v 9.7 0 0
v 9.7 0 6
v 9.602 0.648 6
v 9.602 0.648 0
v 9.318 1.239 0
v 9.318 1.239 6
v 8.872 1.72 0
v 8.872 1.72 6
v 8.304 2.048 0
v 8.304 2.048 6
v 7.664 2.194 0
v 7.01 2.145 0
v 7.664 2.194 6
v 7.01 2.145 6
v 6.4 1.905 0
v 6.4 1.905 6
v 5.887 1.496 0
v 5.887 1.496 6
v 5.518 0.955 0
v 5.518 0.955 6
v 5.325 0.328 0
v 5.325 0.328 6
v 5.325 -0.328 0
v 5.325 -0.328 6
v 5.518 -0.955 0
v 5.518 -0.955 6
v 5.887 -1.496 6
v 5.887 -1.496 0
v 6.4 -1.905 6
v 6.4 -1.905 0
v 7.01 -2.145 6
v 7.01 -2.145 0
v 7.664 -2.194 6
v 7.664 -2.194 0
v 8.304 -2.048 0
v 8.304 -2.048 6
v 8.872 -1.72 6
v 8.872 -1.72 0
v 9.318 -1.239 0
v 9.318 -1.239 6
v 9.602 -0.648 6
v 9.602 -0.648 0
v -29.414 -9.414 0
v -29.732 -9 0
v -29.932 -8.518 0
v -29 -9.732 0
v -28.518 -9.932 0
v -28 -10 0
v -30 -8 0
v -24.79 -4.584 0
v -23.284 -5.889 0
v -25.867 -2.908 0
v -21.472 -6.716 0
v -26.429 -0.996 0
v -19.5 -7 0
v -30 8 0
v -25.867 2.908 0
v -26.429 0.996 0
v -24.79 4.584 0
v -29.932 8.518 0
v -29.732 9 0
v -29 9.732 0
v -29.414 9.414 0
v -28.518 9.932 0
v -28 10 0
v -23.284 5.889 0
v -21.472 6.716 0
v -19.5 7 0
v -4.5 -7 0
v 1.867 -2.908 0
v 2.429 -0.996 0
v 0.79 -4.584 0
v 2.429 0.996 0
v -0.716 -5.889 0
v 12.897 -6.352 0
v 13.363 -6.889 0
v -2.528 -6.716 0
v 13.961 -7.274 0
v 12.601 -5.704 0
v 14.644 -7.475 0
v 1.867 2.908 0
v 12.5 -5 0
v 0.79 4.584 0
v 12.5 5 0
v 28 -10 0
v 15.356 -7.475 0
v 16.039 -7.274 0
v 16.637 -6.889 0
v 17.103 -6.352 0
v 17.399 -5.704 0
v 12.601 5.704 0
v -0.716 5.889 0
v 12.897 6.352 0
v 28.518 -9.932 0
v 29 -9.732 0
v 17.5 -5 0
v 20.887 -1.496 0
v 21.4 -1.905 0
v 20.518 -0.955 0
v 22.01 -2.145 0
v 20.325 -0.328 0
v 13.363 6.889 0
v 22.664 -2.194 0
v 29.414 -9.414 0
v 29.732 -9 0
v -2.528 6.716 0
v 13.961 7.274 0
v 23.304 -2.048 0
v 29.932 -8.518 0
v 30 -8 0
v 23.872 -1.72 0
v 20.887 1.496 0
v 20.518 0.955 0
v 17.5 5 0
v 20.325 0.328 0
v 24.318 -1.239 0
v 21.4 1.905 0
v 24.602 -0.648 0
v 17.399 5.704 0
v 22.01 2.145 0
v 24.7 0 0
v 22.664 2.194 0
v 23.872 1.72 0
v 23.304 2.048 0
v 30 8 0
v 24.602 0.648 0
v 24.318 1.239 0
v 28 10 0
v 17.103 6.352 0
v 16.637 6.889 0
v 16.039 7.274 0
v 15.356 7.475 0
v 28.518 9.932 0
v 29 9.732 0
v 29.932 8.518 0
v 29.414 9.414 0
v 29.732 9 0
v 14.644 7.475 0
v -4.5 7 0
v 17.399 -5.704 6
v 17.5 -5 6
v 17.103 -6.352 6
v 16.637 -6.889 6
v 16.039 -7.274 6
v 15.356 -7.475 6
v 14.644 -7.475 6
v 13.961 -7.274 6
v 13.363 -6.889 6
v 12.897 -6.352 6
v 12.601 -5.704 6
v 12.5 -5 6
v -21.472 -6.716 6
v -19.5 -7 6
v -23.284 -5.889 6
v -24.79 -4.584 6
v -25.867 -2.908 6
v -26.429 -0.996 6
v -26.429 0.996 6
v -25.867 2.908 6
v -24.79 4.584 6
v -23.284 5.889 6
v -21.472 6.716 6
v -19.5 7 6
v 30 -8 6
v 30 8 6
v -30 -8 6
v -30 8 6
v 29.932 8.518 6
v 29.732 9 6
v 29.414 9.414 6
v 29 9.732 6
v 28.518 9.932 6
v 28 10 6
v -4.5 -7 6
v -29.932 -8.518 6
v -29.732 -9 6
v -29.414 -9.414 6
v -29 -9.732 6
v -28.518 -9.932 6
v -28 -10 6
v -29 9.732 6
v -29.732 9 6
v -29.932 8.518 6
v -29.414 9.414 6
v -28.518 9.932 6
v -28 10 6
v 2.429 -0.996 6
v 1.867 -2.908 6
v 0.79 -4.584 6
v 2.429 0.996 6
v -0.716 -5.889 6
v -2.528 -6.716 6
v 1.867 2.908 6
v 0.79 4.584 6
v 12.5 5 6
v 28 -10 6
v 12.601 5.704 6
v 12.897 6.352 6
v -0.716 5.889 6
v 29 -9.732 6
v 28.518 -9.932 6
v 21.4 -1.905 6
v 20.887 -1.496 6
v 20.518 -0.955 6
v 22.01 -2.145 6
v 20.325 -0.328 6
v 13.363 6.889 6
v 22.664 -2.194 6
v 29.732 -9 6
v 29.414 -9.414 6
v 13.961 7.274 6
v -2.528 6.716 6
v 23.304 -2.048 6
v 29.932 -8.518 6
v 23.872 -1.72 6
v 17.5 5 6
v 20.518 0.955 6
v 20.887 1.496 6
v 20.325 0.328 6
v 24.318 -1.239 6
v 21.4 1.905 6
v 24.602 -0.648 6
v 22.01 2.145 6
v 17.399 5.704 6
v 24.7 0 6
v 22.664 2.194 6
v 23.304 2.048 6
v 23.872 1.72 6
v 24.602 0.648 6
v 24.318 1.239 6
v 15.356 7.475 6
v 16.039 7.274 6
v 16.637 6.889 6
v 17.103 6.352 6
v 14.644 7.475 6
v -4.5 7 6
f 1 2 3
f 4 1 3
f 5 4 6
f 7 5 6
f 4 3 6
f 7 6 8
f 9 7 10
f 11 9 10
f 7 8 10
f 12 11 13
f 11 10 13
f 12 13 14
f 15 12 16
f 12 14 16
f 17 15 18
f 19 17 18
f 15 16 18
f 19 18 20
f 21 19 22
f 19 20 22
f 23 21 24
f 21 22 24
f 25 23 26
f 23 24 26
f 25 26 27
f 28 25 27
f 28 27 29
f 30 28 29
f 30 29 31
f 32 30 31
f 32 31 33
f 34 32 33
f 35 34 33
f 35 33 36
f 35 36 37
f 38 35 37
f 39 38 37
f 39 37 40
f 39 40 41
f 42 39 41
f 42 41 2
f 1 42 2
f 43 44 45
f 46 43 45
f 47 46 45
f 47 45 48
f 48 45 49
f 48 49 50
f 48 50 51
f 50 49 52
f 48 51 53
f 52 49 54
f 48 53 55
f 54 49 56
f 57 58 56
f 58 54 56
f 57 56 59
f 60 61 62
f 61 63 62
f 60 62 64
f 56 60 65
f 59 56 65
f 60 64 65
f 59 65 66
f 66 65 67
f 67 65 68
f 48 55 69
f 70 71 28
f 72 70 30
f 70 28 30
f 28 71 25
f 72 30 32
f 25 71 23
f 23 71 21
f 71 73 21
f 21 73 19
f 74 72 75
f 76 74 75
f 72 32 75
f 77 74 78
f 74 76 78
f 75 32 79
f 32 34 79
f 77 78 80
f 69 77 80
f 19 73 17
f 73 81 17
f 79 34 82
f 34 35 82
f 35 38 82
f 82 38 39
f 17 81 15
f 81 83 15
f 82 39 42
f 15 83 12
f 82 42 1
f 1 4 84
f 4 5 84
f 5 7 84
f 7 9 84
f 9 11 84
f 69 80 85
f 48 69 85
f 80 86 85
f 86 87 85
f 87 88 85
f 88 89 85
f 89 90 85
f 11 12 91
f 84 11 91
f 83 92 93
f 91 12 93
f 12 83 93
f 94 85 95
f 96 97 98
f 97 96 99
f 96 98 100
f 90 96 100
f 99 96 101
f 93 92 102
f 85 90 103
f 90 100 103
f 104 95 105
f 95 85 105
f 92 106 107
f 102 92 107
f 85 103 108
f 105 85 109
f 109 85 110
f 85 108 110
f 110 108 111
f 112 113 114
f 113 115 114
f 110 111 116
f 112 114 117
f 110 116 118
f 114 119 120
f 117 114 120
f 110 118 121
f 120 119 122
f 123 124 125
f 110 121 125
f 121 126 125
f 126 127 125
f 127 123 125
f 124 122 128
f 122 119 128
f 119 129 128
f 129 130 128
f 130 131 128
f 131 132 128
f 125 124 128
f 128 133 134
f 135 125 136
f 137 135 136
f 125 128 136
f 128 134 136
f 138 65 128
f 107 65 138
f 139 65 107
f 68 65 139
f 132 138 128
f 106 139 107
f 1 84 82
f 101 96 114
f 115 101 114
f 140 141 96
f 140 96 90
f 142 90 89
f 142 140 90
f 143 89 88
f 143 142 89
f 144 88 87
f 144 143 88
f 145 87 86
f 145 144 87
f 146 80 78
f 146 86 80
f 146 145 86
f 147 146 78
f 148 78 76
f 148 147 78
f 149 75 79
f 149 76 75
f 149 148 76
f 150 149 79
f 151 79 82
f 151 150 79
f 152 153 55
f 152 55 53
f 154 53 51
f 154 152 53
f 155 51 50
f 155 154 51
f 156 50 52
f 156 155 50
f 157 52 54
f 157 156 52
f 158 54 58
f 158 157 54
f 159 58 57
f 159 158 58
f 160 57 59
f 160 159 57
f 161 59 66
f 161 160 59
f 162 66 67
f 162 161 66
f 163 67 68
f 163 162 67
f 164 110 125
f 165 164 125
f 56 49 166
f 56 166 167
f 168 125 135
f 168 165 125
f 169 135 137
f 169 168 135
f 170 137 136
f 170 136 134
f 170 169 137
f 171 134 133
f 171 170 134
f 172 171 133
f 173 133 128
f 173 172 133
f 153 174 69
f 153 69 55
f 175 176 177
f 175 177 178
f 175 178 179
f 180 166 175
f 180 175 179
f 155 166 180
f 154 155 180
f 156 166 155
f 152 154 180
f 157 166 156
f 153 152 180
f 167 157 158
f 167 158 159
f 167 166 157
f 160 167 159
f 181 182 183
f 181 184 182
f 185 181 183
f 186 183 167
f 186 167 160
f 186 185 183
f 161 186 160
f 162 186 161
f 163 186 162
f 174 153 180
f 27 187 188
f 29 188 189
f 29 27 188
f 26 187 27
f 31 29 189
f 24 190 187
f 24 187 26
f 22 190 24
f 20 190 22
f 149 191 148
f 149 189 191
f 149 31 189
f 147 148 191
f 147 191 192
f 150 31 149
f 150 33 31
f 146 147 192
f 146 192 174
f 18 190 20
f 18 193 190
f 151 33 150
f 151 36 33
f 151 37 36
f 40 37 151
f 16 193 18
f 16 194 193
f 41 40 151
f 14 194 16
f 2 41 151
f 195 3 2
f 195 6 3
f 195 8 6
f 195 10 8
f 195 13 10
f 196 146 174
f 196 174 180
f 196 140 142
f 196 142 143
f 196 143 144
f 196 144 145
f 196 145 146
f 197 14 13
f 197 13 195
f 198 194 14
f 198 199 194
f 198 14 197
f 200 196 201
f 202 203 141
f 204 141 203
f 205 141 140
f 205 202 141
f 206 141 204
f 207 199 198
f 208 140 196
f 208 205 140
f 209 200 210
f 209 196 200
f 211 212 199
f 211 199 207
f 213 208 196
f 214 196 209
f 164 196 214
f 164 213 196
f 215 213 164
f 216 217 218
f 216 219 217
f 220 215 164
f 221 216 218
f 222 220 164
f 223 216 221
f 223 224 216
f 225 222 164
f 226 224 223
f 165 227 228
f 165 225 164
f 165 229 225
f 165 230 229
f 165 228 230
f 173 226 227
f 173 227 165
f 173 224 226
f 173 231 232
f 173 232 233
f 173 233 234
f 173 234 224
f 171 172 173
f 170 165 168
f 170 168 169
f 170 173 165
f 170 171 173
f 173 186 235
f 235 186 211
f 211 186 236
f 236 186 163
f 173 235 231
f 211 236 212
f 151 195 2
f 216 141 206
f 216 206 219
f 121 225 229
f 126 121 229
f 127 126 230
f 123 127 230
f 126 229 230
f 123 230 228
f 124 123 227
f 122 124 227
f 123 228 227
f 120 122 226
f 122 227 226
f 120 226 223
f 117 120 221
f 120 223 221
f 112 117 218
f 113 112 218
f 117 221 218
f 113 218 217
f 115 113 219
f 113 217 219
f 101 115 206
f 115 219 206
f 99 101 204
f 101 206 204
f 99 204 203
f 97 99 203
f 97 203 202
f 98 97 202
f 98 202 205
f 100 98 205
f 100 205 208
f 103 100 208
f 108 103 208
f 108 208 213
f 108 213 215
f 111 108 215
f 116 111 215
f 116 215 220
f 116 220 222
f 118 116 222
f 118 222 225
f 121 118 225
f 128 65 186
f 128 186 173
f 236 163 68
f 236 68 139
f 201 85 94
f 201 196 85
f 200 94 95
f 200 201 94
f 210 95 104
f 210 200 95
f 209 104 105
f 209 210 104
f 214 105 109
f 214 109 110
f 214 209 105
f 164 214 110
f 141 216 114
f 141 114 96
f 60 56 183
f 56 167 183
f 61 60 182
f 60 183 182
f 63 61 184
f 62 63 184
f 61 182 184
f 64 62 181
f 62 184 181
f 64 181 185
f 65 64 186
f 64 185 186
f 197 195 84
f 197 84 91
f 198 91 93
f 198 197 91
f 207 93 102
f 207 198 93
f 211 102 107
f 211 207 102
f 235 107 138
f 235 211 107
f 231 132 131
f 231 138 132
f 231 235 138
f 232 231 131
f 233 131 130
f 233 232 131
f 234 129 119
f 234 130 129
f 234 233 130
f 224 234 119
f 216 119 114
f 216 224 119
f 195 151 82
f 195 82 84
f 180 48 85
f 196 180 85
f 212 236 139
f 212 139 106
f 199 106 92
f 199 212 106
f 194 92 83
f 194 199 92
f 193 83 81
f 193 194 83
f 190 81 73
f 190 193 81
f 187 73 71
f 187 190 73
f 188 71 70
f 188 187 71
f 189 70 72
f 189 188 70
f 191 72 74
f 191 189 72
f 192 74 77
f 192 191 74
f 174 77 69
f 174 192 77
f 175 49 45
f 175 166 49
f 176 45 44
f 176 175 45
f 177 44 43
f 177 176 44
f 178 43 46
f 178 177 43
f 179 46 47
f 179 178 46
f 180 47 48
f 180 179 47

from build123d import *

# Parameters (mm, degrees)
SKETCH_1_W          = 60
SKETCH_1_H          = 20
EXTRUDE_1_DEPTH     = 6
FILLET_1_R          = 2
SKETCH_2_R          = 2.2
CUT_EXTRUDE_1_DEPTH = 33.186953879
CUT_EXTRUDE_2_DEPTH = 33.186953879


with BuildPart() as part:
    # 草图1 → 凸台-拉伸1 (new body)
    with BuildSketch(Plane.XY):
        Rectangle(SKETCH_1_W, SKETCH_1_H)
    extrude(amount=EXTRUDE_1_DEPTH)

    # 圆角1
    fillet_1_edges = [part.edges().sort_by_distance(p)[0] for p in [
        (30, -10, 3),
        (-30, -10, 3),
        (-30, 10, 3),
        (30, 10, 3),
    ]]
    fillet(fillet_1_edges, radius=FILLET_1_R)

    # 草图2 → 切除-拉伸1 (cut, through all)
    with BuildSketch(Plane.XY.offset(6)):
        with Locations((22.5, 0)):
            Circle(SKETCH_2_R)
        with Locations((7.5, 0)):
            Circle(SKETCH_2_R)
    extrude(amount=-CUT_EXTRUDE_1_DEPTH, mode=Mode.SUBTRACT)

    # 草图3 → 切除-拉伸2 (cut, through all)
    with BuildSketch(Plane.XY.offset(6)):
        with BuildLine():
            Line((-19.5, 7), (-4.5, 7))
            ThreePointArc((-4.5, 7), (2.5, 0), (-4.5, -7))
            Line((-4.5, -7), (-19.5, -7))
            ThreePointArc((-19.5, -7), (-26.5, 0), (-19.5, 7))
        make_face()
        with BuildLine():
            Line((12.5, -5), (12.5, 5))
            ThreePointArc((12.5, 5), (15, 7.5), (17.5, 5))
            Line((17.5, 5), (17.5, -5))
            ThreePointArc((17.5, -5), (15, -7.5), (12.5, -5))
        make_face()
    extrude(amount=-CUT_EXTRUDE_2_DEPTH, mode=Mode.SUBTRACT)


solid = part.part
